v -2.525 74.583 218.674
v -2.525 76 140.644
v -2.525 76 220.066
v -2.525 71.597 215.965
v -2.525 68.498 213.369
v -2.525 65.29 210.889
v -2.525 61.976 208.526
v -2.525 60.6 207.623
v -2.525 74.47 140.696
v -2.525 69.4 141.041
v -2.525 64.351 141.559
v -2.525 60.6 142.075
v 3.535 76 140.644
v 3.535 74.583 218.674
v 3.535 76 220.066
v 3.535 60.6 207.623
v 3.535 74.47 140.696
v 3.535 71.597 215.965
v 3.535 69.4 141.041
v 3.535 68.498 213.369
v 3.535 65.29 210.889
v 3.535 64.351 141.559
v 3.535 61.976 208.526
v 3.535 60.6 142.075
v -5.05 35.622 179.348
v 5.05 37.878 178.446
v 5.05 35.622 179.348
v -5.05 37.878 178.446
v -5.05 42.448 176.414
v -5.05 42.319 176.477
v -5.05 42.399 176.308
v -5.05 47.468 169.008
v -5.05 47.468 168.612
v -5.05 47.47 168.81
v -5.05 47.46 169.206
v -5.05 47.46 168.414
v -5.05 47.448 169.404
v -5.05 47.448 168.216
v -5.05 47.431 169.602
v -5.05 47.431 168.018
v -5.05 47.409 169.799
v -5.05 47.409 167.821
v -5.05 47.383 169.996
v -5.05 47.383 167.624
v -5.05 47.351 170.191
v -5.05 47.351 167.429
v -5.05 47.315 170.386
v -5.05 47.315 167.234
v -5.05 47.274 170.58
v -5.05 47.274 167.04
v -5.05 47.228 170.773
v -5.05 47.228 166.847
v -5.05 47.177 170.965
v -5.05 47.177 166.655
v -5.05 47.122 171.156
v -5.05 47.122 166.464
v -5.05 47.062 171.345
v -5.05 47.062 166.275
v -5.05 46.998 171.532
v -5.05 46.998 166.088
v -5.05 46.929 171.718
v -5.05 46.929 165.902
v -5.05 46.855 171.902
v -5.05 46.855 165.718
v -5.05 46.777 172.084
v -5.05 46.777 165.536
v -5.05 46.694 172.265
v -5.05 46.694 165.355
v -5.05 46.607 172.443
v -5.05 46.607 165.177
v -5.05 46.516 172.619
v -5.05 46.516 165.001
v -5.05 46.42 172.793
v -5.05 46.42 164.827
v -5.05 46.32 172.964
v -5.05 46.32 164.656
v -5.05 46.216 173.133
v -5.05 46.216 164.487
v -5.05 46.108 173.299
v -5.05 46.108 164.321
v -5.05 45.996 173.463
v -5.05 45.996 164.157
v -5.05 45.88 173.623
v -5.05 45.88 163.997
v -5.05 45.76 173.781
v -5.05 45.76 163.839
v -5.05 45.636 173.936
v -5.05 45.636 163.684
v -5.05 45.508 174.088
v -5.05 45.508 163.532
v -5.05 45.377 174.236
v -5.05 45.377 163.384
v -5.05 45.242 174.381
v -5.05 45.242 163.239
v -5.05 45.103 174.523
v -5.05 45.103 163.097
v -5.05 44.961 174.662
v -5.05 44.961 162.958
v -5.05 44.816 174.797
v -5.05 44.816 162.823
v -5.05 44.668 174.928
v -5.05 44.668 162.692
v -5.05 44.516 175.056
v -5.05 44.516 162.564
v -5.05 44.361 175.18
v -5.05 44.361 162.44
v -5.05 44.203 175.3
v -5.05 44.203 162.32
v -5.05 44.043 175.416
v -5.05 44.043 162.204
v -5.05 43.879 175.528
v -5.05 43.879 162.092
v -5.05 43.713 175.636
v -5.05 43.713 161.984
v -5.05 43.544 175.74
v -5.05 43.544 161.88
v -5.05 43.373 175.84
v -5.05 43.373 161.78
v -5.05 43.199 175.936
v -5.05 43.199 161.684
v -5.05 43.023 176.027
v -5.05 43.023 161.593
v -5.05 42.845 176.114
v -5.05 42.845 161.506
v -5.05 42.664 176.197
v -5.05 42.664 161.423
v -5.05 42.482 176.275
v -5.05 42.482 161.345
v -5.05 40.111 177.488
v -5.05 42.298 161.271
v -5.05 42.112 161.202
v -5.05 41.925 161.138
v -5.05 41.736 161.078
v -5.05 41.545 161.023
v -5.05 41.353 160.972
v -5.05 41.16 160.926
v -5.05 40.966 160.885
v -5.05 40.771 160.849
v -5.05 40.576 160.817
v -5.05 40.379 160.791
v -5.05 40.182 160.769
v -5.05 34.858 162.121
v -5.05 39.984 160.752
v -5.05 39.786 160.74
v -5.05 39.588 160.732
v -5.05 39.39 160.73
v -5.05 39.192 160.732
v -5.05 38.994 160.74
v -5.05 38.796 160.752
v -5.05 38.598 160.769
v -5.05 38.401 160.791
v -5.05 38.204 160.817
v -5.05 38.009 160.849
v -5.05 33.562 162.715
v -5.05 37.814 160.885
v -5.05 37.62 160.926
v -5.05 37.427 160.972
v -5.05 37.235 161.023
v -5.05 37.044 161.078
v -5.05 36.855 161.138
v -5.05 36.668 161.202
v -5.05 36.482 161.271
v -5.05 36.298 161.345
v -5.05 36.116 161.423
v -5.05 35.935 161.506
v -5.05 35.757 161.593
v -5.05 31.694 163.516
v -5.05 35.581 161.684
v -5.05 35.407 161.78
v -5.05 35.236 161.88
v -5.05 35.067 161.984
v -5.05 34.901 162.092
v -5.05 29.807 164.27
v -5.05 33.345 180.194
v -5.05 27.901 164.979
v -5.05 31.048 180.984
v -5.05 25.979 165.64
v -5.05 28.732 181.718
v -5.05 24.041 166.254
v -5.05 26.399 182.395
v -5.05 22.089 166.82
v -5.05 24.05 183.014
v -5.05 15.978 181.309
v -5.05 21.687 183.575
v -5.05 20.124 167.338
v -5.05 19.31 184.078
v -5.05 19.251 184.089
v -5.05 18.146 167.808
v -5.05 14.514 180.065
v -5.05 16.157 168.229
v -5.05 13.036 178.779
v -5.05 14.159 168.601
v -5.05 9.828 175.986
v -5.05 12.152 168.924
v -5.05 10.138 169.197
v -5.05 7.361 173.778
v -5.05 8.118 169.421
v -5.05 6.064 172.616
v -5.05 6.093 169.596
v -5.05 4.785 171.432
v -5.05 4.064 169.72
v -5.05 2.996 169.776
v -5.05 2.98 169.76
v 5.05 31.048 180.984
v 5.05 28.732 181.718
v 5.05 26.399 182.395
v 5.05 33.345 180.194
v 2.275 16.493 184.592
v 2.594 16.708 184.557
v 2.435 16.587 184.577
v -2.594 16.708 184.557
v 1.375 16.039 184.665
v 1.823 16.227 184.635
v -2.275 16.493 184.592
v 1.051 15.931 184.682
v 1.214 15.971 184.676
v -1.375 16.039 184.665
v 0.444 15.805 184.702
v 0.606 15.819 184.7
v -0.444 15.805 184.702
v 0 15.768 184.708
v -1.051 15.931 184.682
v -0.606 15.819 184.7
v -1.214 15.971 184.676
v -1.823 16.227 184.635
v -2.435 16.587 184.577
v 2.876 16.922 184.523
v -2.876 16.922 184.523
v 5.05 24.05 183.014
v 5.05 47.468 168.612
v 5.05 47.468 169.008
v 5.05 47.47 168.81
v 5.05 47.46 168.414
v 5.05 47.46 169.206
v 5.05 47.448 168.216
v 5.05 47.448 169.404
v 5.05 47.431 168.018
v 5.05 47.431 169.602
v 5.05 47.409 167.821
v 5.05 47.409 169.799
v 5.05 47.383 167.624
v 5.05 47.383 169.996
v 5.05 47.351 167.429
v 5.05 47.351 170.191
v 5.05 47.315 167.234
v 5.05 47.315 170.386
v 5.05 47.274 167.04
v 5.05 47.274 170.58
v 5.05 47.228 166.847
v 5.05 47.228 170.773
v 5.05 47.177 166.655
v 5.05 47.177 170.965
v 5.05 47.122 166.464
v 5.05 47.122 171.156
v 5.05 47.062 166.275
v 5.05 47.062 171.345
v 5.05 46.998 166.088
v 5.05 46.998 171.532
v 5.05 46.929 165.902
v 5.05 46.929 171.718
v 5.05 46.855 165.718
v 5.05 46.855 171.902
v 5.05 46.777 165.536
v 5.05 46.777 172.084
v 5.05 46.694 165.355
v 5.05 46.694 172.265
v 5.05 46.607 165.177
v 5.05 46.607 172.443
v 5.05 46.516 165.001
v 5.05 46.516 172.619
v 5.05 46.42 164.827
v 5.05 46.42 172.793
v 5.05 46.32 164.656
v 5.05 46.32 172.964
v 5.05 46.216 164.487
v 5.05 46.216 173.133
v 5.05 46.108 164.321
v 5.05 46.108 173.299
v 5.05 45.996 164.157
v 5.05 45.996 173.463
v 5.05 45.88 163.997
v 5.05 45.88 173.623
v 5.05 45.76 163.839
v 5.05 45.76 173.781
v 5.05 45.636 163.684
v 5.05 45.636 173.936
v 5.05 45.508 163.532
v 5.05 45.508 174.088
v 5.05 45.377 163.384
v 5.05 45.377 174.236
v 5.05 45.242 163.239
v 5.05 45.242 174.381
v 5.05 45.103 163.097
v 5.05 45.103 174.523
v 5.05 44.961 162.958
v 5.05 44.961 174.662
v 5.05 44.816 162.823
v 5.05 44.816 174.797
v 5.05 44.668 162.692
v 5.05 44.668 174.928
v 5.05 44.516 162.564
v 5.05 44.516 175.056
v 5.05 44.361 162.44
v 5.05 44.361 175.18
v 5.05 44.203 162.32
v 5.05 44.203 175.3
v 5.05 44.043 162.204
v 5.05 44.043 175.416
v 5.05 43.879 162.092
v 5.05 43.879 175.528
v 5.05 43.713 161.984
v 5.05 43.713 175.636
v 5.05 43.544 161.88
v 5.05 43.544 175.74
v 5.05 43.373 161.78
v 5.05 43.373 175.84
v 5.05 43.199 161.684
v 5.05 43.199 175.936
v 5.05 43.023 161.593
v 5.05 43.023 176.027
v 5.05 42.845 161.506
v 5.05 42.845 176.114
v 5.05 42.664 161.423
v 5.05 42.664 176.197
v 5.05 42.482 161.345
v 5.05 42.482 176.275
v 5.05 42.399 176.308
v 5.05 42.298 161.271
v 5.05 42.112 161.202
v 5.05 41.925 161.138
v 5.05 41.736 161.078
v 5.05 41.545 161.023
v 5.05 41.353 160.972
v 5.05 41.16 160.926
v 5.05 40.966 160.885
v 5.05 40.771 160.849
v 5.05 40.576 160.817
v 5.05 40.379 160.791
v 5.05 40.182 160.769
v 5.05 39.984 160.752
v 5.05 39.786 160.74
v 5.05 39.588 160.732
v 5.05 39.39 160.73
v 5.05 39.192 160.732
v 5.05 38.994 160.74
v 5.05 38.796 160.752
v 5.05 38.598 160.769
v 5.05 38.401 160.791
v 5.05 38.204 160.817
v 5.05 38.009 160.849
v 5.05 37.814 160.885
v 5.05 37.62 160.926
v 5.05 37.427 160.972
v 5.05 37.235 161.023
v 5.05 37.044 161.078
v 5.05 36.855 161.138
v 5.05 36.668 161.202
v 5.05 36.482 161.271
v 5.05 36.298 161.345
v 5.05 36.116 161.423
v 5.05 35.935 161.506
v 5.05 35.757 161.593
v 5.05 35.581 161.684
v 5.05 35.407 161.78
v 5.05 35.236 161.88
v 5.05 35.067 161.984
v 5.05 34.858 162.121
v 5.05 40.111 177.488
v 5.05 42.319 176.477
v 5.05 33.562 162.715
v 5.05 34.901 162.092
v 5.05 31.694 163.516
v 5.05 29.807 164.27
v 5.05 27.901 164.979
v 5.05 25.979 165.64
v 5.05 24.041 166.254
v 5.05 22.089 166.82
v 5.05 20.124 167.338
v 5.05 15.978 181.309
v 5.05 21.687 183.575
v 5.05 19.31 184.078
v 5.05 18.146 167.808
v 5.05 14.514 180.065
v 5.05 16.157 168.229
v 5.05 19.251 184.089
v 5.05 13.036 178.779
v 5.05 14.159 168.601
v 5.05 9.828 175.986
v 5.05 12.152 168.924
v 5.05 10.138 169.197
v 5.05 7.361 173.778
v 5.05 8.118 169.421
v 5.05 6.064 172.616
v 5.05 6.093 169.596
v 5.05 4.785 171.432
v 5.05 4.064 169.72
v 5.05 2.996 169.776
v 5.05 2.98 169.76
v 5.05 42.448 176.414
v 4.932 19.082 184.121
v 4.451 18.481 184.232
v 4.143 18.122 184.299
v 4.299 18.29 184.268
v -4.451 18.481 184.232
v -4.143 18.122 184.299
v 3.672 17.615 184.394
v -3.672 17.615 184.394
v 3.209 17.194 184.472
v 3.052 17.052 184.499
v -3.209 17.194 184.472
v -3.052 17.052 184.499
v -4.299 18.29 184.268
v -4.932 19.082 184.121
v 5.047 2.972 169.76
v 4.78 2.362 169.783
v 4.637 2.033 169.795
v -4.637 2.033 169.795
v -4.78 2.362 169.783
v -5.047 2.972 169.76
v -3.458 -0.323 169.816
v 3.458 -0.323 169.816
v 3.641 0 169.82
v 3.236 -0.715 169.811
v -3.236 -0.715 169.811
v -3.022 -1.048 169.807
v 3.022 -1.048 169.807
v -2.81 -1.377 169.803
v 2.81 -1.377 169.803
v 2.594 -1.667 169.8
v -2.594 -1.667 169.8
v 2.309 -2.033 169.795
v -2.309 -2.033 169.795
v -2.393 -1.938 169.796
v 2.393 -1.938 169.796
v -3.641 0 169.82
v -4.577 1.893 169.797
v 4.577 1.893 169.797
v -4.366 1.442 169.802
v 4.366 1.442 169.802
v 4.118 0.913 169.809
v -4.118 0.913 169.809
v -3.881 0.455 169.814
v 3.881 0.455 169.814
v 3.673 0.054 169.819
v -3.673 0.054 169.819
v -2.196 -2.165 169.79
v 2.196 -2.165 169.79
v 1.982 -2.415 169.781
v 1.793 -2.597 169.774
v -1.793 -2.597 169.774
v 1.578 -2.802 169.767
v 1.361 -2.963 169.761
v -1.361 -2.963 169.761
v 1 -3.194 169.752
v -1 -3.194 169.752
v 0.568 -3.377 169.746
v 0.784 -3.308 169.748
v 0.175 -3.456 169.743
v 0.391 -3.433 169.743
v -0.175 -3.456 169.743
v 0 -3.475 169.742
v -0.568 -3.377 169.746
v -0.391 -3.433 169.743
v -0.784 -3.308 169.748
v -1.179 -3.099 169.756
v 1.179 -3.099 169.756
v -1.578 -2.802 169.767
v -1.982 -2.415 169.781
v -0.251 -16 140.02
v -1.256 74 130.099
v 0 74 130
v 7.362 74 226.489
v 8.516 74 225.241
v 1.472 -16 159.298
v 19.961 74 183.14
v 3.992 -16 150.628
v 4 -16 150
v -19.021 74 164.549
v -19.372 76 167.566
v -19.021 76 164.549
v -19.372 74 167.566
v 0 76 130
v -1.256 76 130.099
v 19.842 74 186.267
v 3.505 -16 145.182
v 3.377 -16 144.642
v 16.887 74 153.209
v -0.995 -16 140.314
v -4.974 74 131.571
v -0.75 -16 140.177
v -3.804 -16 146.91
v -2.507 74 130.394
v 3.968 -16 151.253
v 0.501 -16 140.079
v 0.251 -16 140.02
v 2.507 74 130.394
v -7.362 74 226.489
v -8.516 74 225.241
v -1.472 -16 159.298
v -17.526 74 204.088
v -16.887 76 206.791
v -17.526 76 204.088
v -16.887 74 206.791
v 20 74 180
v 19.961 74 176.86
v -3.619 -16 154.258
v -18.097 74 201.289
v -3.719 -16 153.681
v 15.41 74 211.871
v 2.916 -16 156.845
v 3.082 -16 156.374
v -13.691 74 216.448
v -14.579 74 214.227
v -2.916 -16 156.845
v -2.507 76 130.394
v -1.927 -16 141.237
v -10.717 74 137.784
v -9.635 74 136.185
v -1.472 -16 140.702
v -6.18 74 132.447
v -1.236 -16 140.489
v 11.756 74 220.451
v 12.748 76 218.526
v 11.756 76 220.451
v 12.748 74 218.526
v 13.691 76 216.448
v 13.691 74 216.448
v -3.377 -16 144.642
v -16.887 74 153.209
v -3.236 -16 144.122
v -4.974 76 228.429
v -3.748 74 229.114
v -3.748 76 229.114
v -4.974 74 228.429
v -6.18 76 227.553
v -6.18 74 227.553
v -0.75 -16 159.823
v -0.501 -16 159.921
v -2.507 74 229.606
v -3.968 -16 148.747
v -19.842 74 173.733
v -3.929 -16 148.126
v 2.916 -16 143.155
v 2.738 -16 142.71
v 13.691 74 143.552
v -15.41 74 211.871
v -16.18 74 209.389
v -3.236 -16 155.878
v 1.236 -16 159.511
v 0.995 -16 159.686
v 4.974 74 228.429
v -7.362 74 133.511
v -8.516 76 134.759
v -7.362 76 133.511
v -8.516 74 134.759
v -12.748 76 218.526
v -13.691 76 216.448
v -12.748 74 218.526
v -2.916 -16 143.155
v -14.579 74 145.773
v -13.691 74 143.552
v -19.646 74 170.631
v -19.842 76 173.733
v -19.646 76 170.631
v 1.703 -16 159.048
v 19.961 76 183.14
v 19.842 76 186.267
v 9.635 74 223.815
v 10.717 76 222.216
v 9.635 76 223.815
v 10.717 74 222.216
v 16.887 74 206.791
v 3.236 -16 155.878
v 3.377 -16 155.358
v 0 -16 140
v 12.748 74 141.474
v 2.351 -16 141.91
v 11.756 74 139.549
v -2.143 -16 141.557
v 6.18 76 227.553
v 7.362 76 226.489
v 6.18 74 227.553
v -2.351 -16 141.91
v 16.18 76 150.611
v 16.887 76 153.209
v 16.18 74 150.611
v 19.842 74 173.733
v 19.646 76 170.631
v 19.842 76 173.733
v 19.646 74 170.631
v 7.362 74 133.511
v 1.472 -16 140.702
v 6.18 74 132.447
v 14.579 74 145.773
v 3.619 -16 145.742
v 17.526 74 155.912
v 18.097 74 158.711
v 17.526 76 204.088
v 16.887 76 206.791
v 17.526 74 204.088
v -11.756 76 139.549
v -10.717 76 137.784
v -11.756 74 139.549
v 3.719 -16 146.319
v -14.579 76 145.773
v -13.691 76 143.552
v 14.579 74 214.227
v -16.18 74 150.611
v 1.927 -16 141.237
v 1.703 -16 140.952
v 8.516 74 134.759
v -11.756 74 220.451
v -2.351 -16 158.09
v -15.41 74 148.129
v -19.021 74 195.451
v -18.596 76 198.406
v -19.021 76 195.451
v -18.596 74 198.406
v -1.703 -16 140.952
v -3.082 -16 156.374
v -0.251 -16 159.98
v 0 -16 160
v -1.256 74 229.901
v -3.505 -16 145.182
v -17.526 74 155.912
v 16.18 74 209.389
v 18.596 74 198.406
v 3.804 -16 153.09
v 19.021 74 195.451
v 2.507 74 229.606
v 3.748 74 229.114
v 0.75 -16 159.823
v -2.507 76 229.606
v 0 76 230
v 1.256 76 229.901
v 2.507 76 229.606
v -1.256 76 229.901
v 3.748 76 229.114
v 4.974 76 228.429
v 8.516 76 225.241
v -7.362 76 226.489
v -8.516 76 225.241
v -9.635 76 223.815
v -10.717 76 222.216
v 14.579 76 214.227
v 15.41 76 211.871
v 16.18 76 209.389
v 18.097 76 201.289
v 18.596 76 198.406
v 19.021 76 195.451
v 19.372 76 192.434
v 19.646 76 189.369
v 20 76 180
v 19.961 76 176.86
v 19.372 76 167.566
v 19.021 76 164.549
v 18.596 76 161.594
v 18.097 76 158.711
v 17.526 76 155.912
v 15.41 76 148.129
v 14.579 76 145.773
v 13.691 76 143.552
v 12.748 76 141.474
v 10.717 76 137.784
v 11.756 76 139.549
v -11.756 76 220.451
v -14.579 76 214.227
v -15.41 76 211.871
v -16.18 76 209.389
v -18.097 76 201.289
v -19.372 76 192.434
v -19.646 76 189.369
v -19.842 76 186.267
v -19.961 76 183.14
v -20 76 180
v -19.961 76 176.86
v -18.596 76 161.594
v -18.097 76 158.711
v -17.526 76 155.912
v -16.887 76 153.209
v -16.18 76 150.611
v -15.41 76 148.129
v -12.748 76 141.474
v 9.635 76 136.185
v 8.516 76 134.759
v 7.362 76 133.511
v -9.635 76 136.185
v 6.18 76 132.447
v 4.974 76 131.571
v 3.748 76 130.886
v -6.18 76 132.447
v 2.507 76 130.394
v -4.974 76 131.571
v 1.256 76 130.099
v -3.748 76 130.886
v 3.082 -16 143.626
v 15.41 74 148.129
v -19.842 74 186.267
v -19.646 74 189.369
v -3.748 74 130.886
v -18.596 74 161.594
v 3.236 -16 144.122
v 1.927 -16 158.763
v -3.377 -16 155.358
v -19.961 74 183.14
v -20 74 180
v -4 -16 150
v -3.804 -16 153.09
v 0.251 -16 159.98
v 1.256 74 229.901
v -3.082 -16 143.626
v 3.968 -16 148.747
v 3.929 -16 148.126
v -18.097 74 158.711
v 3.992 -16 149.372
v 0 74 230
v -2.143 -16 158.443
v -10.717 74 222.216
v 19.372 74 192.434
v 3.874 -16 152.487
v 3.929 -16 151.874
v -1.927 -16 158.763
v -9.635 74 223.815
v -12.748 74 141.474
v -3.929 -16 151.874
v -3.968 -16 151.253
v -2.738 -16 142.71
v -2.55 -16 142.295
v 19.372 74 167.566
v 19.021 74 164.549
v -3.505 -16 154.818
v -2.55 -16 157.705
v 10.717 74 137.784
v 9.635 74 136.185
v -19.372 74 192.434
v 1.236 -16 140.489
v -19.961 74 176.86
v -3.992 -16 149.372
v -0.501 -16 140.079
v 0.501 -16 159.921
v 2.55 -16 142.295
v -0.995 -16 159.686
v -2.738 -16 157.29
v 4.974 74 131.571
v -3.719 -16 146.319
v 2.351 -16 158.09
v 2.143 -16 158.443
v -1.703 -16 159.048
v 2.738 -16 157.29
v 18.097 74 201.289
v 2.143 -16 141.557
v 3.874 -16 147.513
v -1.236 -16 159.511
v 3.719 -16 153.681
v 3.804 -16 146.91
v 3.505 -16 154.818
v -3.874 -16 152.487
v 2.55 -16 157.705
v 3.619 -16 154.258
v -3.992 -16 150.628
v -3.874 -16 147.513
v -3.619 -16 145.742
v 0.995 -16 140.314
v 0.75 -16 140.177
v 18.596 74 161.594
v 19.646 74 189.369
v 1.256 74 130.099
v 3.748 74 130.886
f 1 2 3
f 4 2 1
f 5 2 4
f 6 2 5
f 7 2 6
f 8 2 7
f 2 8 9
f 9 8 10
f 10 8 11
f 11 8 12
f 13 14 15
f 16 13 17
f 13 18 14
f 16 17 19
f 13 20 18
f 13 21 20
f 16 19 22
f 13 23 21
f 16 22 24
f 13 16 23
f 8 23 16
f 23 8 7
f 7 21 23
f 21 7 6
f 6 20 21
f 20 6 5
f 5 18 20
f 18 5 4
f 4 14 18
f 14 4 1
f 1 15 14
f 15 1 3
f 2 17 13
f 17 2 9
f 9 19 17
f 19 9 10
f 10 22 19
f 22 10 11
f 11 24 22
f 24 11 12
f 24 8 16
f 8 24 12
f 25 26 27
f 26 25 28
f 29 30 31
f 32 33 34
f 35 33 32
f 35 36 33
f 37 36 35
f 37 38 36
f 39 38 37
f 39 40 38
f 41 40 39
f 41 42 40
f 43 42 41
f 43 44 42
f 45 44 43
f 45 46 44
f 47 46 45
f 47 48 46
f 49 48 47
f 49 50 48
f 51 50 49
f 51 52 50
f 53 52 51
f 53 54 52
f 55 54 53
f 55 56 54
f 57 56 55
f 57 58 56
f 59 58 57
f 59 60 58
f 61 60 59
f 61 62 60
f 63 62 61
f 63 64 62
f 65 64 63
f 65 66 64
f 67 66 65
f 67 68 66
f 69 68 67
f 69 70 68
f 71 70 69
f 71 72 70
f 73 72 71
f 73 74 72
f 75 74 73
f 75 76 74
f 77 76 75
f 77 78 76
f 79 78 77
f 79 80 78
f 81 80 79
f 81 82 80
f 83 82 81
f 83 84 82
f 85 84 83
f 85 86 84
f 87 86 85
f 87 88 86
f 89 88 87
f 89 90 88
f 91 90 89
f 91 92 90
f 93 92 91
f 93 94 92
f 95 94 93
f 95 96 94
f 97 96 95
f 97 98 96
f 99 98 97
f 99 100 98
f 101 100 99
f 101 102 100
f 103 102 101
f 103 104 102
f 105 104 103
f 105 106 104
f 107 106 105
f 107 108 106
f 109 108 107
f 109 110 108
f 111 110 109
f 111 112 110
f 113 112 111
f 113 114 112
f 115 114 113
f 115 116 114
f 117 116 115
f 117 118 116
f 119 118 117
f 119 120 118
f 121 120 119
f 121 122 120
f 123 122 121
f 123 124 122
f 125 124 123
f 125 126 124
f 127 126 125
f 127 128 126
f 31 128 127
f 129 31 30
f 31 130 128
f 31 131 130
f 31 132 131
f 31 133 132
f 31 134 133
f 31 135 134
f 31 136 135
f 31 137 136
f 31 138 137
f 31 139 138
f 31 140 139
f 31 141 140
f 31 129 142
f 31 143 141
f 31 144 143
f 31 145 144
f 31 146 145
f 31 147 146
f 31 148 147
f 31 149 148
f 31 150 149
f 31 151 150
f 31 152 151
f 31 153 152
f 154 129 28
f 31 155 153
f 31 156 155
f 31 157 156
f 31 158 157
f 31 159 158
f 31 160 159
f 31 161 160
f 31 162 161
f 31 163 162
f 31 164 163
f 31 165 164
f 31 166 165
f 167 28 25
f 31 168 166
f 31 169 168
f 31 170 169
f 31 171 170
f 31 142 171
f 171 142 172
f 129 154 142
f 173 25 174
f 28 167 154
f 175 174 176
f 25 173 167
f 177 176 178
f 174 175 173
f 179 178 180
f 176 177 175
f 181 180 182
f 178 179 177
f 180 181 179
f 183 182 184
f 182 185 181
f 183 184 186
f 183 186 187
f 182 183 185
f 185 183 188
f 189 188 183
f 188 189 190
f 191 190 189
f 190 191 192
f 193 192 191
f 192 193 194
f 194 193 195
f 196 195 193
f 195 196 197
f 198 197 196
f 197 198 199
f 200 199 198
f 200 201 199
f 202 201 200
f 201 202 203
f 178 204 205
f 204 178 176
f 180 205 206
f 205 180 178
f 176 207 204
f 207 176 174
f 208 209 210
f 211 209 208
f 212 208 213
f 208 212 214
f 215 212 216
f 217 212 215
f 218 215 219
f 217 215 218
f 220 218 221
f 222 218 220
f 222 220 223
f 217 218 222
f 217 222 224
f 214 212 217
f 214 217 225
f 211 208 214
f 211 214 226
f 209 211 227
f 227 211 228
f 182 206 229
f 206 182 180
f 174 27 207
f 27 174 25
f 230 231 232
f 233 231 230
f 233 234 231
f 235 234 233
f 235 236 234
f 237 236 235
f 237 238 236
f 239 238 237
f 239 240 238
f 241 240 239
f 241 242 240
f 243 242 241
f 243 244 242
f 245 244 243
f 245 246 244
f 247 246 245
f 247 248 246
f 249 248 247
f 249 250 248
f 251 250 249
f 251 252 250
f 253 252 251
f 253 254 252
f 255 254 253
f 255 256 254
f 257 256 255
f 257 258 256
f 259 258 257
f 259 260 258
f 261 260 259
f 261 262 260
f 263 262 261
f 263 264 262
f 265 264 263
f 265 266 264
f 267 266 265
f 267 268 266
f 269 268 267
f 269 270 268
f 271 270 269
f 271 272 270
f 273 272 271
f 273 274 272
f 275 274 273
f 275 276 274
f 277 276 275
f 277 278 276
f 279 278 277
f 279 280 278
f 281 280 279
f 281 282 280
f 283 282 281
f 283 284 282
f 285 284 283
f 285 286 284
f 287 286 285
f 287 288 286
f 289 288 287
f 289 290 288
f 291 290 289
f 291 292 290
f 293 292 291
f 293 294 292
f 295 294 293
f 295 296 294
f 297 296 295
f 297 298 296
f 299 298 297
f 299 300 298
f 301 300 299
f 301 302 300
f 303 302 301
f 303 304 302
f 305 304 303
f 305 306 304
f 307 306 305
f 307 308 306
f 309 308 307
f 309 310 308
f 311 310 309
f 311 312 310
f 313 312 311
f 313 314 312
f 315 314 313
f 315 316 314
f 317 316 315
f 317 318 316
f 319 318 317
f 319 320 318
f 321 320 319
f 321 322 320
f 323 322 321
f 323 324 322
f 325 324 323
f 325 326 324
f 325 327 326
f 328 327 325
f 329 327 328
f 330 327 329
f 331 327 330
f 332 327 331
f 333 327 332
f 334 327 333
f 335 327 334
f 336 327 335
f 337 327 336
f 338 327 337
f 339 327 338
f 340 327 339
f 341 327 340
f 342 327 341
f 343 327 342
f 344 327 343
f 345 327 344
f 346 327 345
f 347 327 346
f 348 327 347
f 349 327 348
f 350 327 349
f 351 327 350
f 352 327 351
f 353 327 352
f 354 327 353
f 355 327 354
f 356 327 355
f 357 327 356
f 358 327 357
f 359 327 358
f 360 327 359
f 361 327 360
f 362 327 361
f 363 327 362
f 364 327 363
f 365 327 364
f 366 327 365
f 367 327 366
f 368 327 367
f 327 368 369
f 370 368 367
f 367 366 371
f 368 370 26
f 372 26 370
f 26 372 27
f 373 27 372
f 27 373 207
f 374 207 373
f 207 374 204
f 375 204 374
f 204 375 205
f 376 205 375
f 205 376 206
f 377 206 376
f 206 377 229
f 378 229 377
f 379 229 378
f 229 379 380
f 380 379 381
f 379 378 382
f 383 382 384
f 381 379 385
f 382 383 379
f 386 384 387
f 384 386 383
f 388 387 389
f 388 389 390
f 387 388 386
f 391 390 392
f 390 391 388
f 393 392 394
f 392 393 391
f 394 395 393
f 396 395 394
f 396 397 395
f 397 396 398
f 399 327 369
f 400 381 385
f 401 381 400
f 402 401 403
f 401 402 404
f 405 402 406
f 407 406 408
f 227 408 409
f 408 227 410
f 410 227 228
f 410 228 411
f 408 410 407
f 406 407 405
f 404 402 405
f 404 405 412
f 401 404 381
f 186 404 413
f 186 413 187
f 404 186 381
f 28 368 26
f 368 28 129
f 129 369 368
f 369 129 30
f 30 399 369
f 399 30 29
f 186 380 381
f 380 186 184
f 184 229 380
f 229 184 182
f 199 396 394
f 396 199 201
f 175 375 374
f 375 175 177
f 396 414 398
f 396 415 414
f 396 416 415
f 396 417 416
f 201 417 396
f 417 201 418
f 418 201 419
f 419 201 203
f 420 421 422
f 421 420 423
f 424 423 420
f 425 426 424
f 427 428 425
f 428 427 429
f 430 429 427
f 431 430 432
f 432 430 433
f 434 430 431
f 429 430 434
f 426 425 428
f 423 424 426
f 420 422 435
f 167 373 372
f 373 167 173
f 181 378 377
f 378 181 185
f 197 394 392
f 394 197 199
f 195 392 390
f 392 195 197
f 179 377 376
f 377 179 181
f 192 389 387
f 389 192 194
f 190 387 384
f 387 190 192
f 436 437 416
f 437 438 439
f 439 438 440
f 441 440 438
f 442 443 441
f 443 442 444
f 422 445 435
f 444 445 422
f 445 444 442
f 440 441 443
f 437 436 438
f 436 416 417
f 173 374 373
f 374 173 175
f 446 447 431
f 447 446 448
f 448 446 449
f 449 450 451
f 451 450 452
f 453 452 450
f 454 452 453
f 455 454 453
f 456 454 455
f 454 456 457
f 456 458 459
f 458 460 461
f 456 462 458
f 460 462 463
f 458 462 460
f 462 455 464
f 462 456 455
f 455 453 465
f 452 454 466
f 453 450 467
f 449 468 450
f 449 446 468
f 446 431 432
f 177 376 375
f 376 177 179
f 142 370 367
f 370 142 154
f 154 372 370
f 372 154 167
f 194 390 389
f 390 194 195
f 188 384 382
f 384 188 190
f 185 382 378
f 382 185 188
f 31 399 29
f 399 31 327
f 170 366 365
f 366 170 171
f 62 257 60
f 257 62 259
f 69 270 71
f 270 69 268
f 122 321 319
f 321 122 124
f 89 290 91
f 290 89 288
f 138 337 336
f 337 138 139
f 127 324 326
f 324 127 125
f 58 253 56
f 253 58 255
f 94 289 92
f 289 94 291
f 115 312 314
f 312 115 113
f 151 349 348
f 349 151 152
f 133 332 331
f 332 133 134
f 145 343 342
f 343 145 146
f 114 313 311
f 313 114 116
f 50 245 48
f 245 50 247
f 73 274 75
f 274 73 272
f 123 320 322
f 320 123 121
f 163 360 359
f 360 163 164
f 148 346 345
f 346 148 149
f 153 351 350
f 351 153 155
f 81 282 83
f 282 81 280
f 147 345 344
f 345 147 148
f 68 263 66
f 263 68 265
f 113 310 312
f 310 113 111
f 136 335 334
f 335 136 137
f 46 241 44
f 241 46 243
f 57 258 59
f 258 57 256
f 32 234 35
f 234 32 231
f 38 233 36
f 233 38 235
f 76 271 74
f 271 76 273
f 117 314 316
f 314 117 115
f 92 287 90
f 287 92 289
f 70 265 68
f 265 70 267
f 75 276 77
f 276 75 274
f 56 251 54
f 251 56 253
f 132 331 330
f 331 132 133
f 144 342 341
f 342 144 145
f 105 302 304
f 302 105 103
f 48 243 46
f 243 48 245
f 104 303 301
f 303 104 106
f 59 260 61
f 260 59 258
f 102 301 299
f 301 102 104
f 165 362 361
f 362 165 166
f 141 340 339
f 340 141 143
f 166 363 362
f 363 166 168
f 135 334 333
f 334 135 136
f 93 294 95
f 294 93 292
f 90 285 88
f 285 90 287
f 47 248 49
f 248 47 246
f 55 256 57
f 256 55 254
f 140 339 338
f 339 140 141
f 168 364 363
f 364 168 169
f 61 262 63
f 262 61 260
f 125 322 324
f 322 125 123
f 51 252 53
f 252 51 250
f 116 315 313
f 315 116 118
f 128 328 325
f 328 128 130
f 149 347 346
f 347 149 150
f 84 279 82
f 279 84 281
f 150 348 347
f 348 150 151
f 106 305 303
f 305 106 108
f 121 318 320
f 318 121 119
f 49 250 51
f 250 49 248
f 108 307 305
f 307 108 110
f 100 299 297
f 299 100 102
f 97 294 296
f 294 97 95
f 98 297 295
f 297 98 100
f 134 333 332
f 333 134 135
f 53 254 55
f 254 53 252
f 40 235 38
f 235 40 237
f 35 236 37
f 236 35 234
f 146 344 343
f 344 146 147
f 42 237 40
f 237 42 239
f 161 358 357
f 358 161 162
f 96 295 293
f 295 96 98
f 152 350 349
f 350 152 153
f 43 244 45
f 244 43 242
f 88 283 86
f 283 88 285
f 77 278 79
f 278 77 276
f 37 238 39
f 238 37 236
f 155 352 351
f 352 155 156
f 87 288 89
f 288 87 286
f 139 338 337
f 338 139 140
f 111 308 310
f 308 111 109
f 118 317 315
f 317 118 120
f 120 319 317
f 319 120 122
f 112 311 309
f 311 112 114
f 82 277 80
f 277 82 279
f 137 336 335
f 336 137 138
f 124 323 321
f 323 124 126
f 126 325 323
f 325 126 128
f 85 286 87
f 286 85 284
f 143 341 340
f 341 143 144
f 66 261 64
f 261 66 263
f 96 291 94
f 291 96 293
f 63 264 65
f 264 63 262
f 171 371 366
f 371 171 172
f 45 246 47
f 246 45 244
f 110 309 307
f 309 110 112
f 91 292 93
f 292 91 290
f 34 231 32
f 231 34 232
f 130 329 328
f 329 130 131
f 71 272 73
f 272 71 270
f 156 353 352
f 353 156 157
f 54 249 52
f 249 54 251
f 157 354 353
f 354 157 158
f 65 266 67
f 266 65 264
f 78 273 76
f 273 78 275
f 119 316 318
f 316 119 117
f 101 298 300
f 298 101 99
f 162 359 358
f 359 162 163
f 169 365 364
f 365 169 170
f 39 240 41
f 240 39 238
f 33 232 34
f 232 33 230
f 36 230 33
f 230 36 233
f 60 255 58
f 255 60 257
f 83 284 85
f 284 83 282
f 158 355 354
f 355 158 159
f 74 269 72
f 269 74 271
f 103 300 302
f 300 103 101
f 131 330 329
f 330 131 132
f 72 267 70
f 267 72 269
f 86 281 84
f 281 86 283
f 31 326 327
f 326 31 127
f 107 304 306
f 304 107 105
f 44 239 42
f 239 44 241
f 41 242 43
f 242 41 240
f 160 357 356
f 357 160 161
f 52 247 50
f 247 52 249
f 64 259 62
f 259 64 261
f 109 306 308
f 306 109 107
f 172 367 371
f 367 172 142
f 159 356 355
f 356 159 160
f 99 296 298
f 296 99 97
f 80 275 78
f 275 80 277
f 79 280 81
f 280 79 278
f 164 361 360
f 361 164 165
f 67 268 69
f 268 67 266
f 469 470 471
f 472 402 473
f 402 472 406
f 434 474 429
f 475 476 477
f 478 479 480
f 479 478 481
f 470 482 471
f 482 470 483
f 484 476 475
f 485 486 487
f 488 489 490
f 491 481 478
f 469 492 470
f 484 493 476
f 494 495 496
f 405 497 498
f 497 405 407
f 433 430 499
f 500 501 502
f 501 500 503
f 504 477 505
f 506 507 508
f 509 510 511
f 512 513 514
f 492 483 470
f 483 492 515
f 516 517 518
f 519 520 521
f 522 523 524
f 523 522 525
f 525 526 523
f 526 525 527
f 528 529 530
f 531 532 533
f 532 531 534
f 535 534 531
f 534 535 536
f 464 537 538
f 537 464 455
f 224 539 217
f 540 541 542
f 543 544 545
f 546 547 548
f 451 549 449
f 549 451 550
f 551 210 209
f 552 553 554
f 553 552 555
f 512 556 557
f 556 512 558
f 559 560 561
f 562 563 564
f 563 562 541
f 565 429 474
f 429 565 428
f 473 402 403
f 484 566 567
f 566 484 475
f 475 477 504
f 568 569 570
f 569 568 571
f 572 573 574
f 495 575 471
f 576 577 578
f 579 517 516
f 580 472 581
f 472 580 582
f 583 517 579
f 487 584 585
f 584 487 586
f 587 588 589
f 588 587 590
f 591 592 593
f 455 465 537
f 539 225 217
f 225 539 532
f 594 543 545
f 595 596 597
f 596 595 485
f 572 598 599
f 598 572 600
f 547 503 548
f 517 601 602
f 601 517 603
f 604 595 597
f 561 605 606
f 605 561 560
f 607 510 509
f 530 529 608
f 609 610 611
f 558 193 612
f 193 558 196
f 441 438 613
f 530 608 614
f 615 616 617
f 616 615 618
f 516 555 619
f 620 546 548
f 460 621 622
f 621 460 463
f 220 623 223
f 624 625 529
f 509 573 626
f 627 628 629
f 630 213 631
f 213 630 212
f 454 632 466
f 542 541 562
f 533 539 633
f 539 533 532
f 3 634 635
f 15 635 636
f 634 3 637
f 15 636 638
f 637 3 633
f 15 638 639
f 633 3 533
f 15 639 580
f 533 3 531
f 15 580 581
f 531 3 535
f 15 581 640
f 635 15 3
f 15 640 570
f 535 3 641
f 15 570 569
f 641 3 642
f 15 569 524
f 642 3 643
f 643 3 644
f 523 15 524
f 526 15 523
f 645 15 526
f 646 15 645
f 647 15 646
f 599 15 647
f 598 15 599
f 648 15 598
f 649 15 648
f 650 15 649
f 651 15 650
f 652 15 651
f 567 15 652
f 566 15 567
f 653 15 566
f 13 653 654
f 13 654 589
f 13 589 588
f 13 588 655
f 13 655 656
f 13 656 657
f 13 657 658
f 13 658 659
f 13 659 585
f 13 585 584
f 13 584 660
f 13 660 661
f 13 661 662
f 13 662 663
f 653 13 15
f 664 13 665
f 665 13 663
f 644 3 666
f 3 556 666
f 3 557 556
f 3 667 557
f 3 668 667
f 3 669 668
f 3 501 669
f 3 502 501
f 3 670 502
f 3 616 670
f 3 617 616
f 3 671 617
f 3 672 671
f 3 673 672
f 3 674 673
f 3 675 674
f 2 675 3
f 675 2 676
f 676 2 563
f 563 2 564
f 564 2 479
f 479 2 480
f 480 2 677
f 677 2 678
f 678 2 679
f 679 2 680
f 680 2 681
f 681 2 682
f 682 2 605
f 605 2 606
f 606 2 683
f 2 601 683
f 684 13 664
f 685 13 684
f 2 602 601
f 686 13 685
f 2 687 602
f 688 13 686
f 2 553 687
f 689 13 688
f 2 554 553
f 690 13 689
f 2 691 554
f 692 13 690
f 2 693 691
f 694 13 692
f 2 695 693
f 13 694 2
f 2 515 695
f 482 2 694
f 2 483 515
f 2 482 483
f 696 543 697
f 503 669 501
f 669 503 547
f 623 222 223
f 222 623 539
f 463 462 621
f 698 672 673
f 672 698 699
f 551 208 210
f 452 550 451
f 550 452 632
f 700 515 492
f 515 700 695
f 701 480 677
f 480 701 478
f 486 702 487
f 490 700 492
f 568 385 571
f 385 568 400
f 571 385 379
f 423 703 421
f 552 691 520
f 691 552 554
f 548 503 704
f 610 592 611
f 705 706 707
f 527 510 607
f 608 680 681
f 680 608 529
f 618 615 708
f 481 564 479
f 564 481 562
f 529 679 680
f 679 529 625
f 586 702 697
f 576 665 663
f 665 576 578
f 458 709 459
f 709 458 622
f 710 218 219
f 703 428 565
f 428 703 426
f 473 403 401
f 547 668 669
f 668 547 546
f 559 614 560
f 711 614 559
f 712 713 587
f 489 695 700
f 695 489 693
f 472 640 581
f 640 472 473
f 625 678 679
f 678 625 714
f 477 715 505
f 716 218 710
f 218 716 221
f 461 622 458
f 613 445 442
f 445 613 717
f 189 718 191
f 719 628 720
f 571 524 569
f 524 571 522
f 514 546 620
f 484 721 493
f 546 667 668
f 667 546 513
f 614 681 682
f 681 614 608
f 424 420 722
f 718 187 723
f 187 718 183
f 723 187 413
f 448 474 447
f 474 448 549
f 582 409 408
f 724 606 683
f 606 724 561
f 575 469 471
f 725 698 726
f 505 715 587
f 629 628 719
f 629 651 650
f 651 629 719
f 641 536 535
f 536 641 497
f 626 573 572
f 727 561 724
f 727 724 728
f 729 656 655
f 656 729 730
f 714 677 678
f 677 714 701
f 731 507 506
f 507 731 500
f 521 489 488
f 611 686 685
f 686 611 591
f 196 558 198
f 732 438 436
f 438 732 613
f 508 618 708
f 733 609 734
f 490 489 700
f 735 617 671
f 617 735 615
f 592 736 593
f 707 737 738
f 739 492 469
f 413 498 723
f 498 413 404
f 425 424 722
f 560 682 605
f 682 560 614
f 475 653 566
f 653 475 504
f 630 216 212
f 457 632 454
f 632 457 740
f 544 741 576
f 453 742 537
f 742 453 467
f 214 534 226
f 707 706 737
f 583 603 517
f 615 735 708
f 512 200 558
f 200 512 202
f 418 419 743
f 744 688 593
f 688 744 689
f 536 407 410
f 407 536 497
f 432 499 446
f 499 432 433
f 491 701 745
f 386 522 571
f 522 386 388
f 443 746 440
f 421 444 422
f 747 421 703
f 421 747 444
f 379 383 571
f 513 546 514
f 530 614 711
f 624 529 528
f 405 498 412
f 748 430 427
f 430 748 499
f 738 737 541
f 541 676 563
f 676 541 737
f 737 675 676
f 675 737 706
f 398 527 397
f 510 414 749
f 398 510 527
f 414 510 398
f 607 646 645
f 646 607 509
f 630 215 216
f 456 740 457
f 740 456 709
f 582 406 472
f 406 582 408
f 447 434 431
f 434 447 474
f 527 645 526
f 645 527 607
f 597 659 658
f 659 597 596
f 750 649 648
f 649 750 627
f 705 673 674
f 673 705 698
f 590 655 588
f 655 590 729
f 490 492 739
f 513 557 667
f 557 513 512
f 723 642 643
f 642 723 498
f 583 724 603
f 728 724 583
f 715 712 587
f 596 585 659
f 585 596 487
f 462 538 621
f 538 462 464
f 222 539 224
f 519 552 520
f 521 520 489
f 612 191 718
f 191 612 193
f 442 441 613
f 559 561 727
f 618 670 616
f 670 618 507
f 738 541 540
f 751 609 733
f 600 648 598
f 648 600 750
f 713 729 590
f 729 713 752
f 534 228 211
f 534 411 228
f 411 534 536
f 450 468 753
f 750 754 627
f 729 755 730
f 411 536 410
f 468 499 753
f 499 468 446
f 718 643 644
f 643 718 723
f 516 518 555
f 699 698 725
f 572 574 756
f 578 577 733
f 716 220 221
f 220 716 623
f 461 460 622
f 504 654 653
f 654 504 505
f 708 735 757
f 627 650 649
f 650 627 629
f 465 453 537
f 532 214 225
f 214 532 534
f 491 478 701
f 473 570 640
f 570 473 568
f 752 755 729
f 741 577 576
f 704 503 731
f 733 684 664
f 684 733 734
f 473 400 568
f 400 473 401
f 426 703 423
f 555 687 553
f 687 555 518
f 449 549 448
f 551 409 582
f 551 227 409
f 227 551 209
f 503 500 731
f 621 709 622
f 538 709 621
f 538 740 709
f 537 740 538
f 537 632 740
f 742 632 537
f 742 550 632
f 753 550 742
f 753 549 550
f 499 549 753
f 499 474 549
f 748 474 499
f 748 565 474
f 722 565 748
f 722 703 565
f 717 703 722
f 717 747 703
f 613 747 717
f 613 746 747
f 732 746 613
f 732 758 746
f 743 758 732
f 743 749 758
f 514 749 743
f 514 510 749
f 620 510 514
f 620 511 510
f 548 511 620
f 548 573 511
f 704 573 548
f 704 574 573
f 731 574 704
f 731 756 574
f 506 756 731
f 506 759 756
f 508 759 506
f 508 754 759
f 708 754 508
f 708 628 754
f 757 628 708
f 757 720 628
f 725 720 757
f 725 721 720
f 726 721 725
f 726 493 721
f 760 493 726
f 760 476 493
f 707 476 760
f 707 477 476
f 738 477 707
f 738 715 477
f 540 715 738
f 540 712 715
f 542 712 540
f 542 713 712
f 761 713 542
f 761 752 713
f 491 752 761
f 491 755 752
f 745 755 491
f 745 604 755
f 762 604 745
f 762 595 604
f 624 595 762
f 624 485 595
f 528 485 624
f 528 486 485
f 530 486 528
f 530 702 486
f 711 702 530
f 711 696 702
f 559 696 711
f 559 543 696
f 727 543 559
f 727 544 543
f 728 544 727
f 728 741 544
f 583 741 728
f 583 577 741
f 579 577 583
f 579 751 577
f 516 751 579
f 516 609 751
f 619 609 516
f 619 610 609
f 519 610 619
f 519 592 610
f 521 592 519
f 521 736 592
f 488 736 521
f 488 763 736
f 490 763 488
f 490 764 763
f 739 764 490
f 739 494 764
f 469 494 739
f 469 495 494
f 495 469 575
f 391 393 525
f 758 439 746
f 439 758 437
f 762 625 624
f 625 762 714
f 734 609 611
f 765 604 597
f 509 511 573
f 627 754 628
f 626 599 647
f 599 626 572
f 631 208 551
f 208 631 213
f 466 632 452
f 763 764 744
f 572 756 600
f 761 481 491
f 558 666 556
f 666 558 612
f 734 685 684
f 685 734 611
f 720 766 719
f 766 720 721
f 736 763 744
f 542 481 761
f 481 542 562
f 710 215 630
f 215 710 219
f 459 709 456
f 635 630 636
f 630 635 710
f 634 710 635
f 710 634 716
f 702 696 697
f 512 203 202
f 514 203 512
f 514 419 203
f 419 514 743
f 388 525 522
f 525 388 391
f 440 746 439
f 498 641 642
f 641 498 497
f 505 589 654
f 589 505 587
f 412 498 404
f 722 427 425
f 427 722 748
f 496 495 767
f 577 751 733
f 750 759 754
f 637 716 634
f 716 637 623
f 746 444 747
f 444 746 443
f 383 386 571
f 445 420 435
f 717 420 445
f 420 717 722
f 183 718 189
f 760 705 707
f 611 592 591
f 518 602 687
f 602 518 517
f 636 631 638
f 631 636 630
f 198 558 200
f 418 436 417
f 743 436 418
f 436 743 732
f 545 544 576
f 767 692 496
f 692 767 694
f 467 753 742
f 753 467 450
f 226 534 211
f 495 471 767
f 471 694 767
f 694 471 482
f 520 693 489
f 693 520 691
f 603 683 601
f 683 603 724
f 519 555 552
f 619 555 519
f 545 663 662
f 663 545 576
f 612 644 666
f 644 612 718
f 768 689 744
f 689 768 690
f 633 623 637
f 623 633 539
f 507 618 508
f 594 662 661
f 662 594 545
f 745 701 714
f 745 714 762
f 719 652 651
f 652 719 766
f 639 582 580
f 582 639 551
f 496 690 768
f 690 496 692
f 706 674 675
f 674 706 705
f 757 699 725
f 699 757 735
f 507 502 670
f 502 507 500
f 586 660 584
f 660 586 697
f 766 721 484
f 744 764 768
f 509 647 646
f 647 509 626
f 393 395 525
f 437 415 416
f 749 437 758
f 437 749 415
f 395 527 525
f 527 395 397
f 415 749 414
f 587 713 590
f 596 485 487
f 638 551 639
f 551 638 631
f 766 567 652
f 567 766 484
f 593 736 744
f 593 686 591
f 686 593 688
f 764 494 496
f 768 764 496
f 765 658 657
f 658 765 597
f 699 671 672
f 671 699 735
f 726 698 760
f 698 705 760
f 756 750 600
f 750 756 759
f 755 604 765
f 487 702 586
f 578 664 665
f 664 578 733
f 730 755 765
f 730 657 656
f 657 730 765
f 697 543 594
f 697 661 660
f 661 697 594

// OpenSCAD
// file: EschaStaffMaster.scad
PipeDiameter = 28;
PipeRadius = PipeDiameter/2;

module WedgeRemoval45degree()
{
    linear_extrude(height=15)
    {
        polygon([[0,0],[0,1],[1,0]]);
    }
}

module FeatherPrimitive()
{
    mirror([0,1,1])
    rotate([0,-270,0])
linear_extrude(height=6)
{    
intersection()
{
    union()
    {
intersection()
{
    square([100,100]);
    
    
difference()
{
    circle(r=50,center=true,$fn=200);
    scale([0.65,0.85,1]) circle(r=50,center=true,$fn=200);
    
}

}
translate([41.2,0,0]) scale([1,0.75,1]) circle(d=17.5,center=true,$fn=200);
    }
    scale([0.75,0.8,1])circle(r=60,center=true,$fn=200);
    //translate([0,15,0])scale([0.75,0.8,1])circle(r=60,center=true,$fn=200);
    translate([5,46,0])rotate([0,0,45])scale([0.25,0.8,1])circle(r=60,center=true,$fn=200);
}
}
}

module EschaStaffCenterJewel()
{
    difference()
    {
    render()
    {
        minkowski()
        {
            union()
            {
    InnerRadius = PipeRadius+2;
    OuterRadius = PipeRadius+6;
    translate([0,0,-22.5])cylinder(h=25,r1=InnerRadius,r2=OuterRadius,center=true,$fn=200);
    cylinder(h=20,r=OuterRadius,center=true,$fn=200);
    translate([0,0,22.5]) cylinder(h=25,r1=OuterRadius,r2=InnerRadius,center=true,$fn=200); 
            }
            sphere(r=5,$fn=50);
        }
    }
    scale([1.05,1.05,1.05]) EschaStaffCircularHead();
    }
}

module EschaStaffCircularHead()
{
    HeadRadius = 180/2;
    HeadRadiusInner = HeadRadius-8;
    HeadRadiusOuter = HeadRadius+8;
    union()
    {
        difference()
        {
            translate([0,0,HeadRadius-3]) rotate([0,90,0]) cylinder(h=10,r=HeadRadiusOuter,center=true,$fn=256);
            translate([0,0,HeadRadius-3]) rotate([0,90,0]) cylinder(h=10+1,r=HeadRadiusInner,center=true,$fn=256);
            translate([0,HeadRadius-3,HeadRadius-3]) rotate([45,0,0]) cube([20,120,120],center=true);
            translate([0,HeadRadius-3,HeadRadius+40]) rotate([65,0,0]) cube([20,120,120],center=true);
            translate([-6,40,-9]) cube([2,2,60]);
            translate([-6,44,-9]) cube([2,2,60]);
            translate([-6,36,-9]) cube([2,2,60]);
            translate([-6,-40,-9]) cube([2,2,60]);
            translate([-6,-44,-9]) cube([2,2,60]);
            translate([-6,-36,-9]) cube([2,2,60]);
            translate([4,40,-9]) cube([2,2,60]);
            translate([4,44,-9]) cube([2,2,60]);
            translate([4,36,-9]) cube([2,2,60]);
            translate([4,-40,-9]) cube([2,2,60]);
            translate([4,-44,-9]) cube([2,2,60]);
            translate([4,-36,-9]) cube([2,2,60]);
            // Use as a position guide when assembly.
            translate([5.2,0,0]) cube([1,PipeDiameter-1,40],center=true);
        }
        translate([0,64.75,24.5]) rotate([0,90,0]) cylinder(d=16,h=10,center=true,$fn=256);
        translate([0,39,168]) rotate([0,90,0]) cylinder(d=16,h=10,center=true,$fn=256);
        translate([5,-25,-100])
        scale([1,1.5,3]) 
        rotate([90,0,270])
        linear_extrude(height=10)
        {
            intersection()
            {
                difference()
                {
                    circle(r=80,$fn=256);
                    scale([1.2,0.8,1]) circle(r=80,$fn=256);
                    translate([0,-100,0]) square([200,200],center=true);
                    translate([-60,100,0]) square([200,100],center=true);     
                }
                translate([20,45,0]) circle(r=40,$fn=256);
            }
        }
    }
}

module EschaStaffSilverCollar()
{
    InnerRadius = PipeRadius+14;
    OuterRadius = PipeRadius+18;
    difference()
    {
        translate([0,0,-45]) cylinder(h=10,r1=OuterRadius,r2=InnerRadius,$fn=200);
        scale([1.02,1.02,1.02]) EschaStaffCenterJewel();
    }
}

module EschaStaffSilverFlare()
{
    translate([0,0,-53])
    scale([1,1,1.5])
    rotate([0,180,0])
    rotate_extrude($fn=200)
    union()
    {
        translate([40,0,0])circle(r=5);
        translate([0,-5,0])square([40,10]);
        translate([0,5,0])
        difference()
        {
            square([40,90]);
            translate([435,142,0]) circle(r=420,$fn=200);
        }
    }
}

module EschaStaffBlackKnob()
{
    translate([0,0,-216])
    {
        intersection()
        {
            sphere(r=PipeRadius+15,$fn=200);
            cube([2*(PipeRadius+15)+1,2*(PipeRadius+15)+1,1.4*(PipeRadius+15)],center=true);
        }
    }
}

module EschaStaffGoldFlare()
{
    translate([0,0,-283])
    scale([1,1,0.5])
    rotate_extrude($fn=200)
    union()
    {
        difference()
        {
            square([40,90]);
            translate([435,142,0]) circle(r=420,$fn=200);
        }
    }
    
    translate([0,0,-283])
    scale([1,1,1.2])
    rotate([0,180,0])
    rotate_extrude($fn=200)
    union()
    {
        difference()
        {
            square([40,90]);
            translate([435,142,0]) circle(r=420,$fn=200);
        }
    }
}
module EschaStaffSphereUpper()
{
    SphereRadius = 100;
    
    intersection()
    {
        translate([0,0,85]) sphere(d=SphereRadius,$fn=200);
        translate([0,0,185]) cube(200,center=true);
    }
    
    
}

module EschaStaffSphereLower()
{
    SphereRadius = 100;
    difference()
    {
        translate([0,0,85]) sphere(d=SphereRadius,$fn=200);
        translate([0,0,185]) cube(200,center=true);
    }
    
    
}
module EschaStaffFeatherHood()
{
    hull()
    {
        scale([0.4,1,1]) translate([0,-15,150]) rotate([90,0,0]) cylinder(r=10,h=2,center=true,$fn=100);
        scale([0.4,1,1]) translate([0,75,180]) rotate([90,0,0]) cylinder(r=50,h=2,center=true,$fn=100);
    }
    
}
module EschaStaffFerule()
{
   // translate([0,0,-790])
    difference()
    {
    scale([2,2,3])
    rotate_extrude($fn=200)
    {
        translate([10,0,0]) circle(r=5,$fn=200);
        translate([8,7,0]) circle(r=3,$fn=200);
        translate([9,20,0]) circle(r=2,$fn=200);
        translate([5,0,0]) square(10,center=true);
        difference()
        {
            translate([0,-5,0]) square([10,26.88]);
            translate([17,0,0]) scale([0.5,1.5,1]) circle(r=20,$fn=200);
        }
    }
   // cylinder(r=5,h=70,$fn=100,center=true);
    }
}

module EschaStaffFeruleExit()
{
   // translate([0,0,-790])
    {
        cylinder(r=4.8,h=30,$fn=100,center=true);
        translate([0,0,-15]) sphere(r=4.8,$fn=100,center=true);
    }
}

module EschaStaffTopFerule()
{
    difference()
    {
    union()
    {
    translate([0,0,192])
    scale([0.7,0.7,0.7])
    rotate_extrude($fn=200)
    {
        translate([10,0,0]) circle(r=5,$fn=200);
        translate([8,7,0]) circle(r=3,$fn=200);
        translate([8,20,0]) circle(r=2,$fn=200);
        translate([5,0,0]) square(10,center=true);
        difference()
        {
            translate([0,-5,0]) square([10,25]);
            translate([17,0,0]) scale([0.5,1.5,1]) circle(r=20,$fn=200);
        }
    }
    //cylinder(r=5,h=70,$fn=100,center=true);
    
    translate([0,0,182]) 
    {
     
        minkowski()
            {
                cube([20,30,20],center=true);
                sphere(r=3,$fn=50);
            }
    }
    }
    scale([1.05,1.05,1.05]) EschaStaffCircularHead();
    translate([0,0,-15]) scale([1.05,1.05,1.05]) EschaStaffCircularHead();
    scale([1.05,1.05,1.05]) EschaStaffFeatherHood();
    }
}
// main file
include <EschaStaffMaster.scad>;

difference()
{
    union()
    {
        EschaStaffFeatherHood();
    }
    translate([0,0,-0.87]) scale([1.01,1.01,1.01])
    intersection()
    {
        union()
        {
            translate([-2.5,-42,328]) scale([1,4.2,3.5]) rotate([30,0,0]) FeatherPrimitive();
            translate([-2.5,51,343]) scale([1,3.5,3.7]) rotate([-10,0,0]) FeatherPrimitive();
            translate([-2.5,91,314]) scale([1,3.5,3.7]) rotate([-35,0,0]) FeatherPrimitive();
        }
        translate([0,160,200]) cube([20,200,400],center=true);
    }
    translate([0,0,-0.87])scale([1.01,1.01,1.01]) 
    {
        EschaStaffCircularHead();
    }
}
